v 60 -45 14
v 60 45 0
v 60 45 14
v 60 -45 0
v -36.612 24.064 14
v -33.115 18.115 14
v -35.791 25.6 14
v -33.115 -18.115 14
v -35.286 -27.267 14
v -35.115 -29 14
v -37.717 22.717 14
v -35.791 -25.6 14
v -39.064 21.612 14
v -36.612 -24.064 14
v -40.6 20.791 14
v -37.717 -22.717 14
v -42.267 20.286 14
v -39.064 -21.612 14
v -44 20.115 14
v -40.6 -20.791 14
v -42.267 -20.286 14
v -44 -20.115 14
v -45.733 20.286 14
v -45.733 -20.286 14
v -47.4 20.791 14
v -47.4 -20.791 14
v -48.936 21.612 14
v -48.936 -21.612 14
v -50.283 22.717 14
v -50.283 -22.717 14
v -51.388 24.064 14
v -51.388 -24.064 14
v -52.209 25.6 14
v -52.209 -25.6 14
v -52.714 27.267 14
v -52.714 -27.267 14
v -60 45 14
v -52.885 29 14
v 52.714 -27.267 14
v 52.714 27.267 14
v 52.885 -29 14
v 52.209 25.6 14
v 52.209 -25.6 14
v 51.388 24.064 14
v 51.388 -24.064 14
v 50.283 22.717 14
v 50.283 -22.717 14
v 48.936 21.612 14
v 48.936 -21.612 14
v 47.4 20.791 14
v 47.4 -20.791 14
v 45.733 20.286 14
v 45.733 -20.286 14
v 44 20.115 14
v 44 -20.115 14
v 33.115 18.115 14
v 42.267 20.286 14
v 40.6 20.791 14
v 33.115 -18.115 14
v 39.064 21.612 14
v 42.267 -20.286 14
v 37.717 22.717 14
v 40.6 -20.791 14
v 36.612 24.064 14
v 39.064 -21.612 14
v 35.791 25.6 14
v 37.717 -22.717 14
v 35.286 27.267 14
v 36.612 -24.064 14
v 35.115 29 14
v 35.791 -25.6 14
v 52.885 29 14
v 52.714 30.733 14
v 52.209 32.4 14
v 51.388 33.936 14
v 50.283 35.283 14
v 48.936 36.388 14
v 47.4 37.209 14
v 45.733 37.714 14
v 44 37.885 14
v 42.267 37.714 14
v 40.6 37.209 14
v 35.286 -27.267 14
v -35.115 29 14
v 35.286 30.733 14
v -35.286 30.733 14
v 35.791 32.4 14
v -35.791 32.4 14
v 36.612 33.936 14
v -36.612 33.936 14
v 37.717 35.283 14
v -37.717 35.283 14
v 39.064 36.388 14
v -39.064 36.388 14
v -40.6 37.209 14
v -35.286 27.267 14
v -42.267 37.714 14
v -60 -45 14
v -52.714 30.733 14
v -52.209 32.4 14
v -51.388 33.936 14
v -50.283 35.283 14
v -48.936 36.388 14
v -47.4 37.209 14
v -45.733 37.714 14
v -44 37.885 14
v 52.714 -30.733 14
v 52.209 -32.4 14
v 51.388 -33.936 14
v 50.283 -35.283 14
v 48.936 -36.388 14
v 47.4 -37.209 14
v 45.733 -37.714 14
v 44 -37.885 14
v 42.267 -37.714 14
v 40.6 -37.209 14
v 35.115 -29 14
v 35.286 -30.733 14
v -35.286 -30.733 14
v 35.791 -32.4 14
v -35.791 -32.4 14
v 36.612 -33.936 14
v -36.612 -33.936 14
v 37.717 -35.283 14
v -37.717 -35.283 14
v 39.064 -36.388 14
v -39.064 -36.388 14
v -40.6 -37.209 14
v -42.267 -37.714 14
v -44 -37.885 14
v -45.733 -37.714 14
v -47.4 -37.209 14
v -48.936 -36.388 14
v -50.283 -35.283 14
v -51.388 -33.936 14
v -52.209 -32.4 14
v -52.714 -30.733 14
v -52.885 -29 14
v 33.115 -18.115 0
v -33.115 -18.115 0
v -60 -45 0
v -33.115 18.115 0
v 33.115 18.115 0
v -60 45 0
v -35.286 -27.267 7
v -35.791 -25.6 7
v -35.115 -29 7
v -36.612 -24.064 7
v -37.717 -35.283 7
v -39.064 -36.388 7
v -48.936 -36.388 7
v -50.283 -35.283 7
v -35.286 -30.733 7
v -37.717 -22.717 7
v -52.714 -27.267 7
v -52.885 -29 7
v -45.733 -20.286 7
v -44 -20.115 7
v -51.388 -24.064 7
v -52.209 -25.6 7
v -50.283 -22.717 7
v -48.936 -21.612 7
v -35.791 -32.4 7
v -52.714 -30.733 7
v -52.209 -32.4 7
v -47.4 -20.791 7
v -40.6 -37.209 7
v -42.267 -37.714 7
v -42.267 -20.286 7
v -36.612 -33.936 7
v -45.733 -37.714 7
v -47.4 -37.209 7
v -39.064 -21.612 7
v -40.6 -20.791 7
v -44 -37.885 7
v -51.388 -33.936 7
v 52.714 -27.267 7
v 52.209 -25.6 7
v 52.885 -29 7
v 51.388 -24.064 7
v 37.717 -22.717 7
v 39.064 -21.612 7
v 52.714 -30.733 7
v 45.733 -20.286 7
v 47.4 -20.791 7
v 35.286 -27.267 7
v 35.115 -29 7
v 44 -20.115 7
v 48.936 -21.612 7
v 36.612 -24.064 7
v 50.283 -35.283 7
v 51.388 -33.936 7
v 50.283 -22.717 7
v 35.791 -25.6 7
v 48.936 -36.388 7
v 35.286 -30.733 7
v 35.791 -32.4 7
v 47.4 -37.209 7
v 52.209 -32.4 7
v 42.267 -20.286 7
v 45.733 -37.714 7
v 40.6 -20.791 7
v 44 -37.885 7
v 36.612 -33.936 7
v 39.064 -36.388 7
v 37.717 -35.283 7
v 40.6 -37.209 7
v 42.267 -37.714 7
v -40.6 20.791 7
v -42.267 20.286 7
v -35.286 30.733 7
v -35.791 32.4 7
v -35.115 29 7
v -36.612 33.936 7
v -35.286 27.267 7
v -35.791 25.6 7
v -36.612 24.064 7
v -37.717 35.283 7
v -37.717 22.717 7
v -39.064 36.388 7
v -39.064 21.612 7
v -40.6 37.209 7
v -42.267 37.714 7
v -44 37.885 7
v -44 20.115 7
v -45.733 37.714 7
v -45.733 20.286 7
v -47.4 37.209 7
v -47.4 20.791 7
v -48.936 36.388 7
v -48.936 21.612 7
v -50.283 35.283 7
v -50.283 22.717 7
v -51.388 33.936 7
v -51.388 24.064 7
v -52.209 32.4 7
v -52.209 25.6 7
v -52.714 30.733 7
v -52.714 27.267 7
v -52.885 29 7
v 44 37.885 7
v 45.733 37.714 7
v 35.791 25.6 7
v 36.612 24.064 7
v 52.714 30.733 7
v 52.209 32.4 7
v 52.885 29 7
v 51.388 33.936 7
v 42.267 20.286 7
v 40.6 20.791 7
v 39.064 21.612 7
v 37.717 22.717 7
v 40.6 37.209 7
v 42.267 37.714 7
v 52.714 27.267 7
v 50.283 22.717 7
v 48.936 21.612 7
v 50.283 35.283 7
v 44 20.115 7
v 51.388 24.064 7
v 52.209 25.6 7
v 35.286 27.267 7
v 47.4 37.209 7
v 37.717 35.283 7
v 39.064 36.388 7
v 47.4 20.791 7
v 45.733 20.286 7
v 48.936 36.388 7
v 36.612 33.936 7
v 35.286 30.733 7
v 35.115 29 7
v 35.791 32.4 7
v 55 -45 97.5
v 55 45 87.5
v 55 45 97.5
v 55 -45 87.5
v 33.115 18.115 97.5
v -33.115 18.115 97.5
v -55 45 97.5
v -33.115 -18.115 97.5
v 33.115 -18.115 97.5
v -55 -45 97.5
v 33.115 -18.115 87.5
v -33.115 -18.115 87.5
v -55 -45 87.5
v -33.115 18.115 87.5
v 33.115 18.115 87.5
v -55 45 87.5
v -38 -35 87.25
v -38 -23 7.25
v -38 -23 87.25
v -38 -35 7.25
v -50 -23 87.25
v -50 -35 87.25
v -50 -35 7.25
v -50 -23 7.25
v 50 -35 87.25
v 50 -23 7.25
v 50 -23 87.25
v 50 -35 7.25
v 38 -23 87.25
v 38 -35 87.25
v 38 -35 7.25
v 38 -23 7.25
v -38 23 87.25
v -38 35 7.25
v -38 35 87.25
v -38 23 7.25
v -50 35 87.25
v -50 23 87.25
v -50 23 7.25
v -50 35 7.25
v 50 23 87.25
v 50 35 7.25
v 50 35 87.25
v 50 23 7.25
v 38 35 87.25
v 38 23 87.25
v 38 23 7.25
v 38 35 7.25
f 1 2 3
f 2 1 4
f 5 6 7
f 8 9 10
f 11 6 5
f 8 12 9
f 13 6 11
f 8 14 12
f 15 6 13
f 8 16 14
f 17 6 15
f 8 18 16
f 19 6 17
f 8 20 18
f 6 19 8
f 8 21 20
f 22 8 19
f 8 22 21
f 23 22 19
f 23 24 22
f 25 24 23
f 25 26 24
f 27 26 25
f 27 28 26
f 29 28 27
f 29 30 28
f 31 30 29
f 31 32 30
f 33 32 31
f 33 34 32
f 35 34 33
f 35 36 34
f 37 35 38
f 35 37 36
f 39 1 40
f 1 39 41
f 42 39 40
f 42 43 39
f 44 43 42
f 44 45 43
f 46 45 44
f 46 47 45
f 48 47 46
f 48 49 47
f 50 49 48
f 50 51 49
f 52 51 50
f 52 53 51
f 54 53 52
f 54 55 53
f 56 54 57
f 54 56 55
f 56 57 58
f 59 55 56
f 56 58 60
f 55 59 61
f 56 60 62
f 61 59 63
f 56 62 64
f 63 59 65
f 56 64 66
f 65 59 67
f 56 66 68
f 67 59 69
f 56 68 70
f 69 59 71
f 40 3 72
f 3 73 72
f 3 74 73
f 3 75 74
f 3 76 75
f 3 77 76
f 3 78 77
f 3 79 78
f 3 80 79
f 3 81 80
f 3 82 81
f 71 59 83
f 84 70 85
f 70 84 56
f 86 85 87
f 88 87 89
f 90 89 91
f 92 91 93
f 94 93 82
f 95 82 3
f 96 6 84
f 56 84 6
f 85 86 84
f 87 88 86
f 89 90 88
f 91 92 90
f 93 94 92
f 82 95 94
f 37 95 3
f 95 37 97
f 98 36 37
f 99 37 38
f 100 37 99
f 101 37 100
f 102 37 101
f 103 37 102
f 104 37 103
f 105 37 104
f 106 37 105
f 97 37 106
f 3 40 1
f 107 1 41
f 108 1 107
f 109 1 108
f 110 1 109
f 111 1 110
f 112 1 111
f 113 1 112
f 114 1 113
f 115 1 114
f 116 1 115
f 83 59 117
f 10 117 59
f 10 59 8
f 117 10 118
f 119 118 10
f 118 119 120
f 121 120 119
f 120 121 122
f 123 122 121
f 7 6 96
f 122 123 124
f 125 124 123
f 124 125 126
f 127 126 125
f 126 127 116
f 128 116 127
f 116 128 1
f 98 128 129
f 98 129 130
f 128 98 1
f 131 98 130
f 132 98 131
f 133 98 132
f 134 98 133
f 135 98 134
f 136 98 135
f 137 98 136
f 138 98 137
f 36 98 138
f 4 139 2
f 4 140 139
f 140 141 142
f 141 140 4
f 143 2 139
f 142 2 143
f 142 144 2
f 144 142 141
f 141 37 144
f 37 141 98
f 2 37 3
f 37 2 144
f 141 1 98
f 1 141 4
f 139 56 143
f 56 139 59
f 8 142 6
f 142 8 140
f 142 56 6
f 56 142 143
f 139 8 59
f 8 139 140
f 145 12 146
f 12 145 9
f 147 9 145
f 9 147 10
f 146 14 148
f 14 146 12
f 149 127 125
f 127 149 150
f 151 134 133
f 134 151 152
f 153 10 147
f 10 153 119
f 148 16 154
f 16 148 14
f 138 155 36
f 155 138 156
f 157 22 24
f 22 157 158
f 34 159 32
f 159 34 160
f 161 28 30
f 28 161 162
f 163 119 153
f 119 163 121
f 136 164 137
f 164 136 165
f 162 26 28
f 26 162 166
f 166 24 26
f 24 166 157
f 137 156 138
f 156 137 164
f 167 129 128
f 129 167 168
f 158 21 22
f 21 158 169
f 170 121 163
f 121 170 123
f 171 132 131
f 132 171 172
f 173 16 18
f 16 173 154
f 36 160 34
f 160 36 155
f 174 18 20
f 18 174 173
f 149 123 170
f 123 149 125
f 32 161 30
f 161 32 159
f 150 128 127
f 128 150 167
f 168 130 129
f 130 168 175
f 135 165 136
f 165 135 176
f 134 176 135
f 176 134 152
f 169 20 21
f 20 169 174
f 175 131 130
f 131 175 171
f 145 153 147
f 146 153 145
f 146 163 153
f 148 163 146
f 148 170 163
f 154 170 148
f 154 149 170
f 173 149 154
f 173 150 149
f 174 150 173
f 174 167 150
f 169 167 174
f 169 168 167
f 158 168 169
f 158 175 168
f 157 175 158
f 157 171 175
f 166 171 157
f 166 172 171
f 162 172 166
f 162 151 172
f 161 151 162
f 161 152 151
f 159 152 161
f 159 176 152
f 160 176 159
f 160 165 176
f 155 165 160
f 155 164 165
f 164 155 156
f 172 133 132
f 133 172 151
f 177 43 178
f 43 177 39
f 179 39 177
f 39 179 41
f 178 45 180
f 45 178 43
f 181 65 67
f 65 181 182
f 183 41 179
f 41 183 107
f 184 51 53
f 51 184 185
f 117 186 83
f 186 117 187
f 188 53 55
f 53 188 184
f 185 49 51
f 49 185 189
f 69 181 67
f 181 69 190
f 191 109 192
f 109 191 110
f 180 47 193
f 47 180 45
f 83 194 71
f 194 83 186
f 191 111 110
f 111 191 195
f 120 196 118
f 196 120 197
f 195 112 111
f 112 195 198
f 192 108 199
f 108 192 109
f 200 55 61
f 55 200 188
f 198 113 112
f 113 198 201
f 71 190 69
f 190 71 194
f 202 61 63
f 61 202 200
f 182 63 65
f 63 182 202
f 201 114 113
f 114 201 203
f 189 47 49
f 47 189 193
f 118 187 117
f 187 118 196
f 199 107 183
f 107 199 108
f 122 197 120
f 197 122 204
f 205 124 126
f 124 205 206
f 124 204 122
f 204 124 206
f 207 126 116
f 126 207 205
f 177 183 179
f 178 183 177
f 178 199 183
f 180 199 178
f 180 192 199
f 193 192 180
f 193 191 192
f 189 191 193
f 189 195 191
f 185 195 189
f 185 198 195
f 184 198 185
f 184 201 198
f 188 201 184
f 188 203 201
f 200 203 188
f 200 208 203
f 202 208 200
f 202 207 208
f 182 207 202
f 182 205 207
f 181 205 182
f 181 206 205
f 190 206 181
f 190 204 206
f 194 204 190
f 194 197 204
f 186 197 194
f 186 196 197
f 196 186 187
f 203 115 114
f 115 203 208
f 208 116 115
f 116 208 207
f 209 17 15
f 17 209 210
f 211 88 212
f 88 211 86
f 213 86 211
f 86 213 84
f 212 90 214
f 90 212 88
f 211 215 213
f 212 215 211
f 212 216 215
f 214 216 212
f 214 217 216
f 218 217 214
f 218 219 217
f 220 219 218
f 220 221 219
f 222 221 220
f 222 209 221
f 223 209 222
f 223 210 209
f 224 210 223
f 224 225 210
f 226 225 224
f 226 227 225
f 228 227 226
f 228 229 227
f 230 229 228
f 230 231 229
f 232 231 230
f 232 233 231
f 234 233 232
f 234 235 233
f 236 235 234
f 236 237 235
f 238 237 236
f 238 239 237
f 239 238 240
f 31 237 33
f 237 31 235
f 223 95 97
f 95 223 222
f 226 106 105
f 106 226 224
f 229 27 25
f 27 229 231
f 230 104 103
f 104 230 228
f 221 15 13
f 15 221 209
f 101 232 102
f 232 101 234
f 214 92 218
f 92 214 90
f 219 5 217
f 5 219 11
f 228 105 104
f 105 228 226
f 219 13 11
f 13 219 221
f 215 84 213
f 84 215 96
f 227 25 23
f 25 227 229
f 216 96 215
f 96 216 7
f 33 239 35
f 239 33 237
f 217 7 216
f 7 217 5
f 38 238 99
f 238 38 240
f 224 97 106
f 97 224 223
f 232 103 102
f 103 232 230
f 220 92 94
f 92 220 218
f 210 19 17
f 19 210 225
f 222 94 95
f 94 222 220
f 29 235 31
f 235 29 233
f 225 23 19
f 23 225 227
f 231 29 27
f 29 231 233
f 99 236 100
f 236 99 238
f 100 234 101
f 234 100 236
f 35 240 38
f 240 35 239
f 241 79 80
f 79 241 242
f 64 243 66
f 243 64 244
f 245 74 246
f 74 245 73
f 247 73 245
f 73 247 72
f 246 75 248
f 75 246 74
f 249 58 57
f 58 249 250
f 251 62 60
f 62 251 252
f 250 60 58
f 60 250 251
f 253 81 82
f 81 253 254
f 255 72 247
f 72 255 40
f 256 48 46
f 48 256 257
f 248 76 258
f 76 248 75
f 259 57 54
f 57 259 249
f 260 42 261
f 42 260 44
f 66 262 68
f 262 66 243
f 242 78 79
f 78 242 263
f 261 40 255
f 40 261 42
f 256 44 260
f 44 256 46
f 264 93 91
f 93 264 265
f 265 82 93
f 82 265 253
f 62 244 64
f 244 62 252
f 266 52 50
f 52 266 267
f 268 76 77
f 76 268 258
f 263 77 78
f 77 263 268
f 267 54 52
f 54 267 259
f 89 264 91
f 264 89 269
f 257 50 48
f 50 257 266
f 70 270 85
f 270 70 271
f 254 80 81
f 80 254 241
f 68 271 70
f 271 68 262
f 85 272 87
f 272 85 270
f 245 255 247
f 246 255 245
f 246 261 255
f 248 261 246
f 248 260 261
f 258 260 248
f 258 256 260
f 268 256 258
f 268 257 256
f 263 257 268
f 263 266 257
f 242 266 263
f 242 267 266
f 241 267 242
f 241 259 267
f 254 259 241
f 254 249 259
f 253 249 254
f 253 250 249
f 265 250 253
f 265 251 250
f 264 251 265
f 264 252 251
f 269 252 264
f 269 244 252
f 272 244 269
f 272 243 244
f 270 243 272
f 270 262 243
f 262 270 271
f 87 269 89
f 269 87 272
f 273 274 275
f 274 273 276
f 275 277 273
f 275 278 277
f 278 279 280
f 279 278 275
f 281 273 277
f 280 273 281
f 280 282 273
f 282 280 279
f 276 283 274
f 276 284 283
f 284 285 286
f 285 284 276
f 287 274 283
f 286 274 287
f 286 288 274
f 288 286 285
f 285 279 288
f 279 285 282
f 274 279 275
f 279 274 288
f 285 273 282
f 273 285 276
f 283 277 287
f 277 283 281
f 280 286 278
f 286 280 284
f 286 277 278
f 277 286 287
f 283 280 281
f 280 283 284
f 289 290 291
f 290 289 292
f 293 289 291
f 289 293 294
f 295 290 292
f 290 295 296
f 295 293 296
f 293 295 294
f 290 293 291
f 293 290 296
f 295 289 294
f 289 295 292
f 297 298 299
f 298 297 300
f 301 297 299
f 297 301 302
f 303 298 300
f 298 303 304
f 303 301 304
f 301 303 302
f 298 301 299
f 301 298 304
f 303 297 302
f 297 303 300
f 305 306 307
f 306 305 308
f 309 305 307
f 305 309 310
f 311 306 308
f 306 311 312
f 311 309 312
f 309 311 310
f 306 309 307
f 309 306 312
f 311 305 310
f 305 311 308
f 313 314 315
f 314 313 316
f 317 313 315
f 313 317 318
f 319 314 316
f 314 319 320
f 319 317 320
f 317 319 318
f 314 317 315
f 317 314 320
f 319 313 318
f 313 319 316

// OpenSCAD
$fn = 32;

// ------------------------------------------------------------------------
// Frame cube: base 120 x 90 mm, posts 80 mm tall
// Every part is its own module, assembly() places every instance.
// ------------------------------------------------------------------------

// --- part 1 ---
module base_frame() {
  difference() {
    translate([-60, -45, 0]) cube([120, 90, 14]);
    translate([-33.115, -18.115, -1]) cube([66.23, 36.23, 16]);
    translate([-44, -29, 7]) cylinder(h = 8, d = 17.77);
    translate([44, -29, 7]) cylinder(h = 8, d = 17.77);
    translate([-44, 29, 7]) cylinder(h = 8, d = 17.77);
    translate([44, 29, 7]) cylinder(h = 8, d = 17.77);
  }
}

// --- part 2 ---
module corner_post() {
  translate([-6, -6, 0]) cube([12, 12, 80]);
}

// --- part 3 ---
module top_frame() {
  difference() {
    translate([-55, -45, 0]) cube([110, 90, 10]);
    translate([-33.115, -18.115, -1]) cube([66.23, 36.23, 12]);
  }
}

// --- assembly ---
module assembly() {
  color([0.80, 0.24, 0.20]) translate([0, 0, 0]) rotate([0, 0, 0]) base_frame();
  color([0.20, 0.45, 0.75]) translate([-44, -29, 7.25]) rotate([0, 0, 0]) corner_post();
  color([0.25, 0.62, 0.32]) translate([44, -29, 7.25]) rotate([0, 0, 0]) corner_post();
  color([0.92, 0.70, 0.18]) translate([-44, 29, 7.25]) rotate([0, 0, 0]) corner_post();
  color([0.58, 0.35, 0.70]) translate([44, 29, 7.25]) rotate([0, 0, 0]) corner_post();
  color([0.16, 0.66, 0.66]) translate([0, 0, 87.5]) rotate([0, 0, 0]) top_frame();
}

assembly();
